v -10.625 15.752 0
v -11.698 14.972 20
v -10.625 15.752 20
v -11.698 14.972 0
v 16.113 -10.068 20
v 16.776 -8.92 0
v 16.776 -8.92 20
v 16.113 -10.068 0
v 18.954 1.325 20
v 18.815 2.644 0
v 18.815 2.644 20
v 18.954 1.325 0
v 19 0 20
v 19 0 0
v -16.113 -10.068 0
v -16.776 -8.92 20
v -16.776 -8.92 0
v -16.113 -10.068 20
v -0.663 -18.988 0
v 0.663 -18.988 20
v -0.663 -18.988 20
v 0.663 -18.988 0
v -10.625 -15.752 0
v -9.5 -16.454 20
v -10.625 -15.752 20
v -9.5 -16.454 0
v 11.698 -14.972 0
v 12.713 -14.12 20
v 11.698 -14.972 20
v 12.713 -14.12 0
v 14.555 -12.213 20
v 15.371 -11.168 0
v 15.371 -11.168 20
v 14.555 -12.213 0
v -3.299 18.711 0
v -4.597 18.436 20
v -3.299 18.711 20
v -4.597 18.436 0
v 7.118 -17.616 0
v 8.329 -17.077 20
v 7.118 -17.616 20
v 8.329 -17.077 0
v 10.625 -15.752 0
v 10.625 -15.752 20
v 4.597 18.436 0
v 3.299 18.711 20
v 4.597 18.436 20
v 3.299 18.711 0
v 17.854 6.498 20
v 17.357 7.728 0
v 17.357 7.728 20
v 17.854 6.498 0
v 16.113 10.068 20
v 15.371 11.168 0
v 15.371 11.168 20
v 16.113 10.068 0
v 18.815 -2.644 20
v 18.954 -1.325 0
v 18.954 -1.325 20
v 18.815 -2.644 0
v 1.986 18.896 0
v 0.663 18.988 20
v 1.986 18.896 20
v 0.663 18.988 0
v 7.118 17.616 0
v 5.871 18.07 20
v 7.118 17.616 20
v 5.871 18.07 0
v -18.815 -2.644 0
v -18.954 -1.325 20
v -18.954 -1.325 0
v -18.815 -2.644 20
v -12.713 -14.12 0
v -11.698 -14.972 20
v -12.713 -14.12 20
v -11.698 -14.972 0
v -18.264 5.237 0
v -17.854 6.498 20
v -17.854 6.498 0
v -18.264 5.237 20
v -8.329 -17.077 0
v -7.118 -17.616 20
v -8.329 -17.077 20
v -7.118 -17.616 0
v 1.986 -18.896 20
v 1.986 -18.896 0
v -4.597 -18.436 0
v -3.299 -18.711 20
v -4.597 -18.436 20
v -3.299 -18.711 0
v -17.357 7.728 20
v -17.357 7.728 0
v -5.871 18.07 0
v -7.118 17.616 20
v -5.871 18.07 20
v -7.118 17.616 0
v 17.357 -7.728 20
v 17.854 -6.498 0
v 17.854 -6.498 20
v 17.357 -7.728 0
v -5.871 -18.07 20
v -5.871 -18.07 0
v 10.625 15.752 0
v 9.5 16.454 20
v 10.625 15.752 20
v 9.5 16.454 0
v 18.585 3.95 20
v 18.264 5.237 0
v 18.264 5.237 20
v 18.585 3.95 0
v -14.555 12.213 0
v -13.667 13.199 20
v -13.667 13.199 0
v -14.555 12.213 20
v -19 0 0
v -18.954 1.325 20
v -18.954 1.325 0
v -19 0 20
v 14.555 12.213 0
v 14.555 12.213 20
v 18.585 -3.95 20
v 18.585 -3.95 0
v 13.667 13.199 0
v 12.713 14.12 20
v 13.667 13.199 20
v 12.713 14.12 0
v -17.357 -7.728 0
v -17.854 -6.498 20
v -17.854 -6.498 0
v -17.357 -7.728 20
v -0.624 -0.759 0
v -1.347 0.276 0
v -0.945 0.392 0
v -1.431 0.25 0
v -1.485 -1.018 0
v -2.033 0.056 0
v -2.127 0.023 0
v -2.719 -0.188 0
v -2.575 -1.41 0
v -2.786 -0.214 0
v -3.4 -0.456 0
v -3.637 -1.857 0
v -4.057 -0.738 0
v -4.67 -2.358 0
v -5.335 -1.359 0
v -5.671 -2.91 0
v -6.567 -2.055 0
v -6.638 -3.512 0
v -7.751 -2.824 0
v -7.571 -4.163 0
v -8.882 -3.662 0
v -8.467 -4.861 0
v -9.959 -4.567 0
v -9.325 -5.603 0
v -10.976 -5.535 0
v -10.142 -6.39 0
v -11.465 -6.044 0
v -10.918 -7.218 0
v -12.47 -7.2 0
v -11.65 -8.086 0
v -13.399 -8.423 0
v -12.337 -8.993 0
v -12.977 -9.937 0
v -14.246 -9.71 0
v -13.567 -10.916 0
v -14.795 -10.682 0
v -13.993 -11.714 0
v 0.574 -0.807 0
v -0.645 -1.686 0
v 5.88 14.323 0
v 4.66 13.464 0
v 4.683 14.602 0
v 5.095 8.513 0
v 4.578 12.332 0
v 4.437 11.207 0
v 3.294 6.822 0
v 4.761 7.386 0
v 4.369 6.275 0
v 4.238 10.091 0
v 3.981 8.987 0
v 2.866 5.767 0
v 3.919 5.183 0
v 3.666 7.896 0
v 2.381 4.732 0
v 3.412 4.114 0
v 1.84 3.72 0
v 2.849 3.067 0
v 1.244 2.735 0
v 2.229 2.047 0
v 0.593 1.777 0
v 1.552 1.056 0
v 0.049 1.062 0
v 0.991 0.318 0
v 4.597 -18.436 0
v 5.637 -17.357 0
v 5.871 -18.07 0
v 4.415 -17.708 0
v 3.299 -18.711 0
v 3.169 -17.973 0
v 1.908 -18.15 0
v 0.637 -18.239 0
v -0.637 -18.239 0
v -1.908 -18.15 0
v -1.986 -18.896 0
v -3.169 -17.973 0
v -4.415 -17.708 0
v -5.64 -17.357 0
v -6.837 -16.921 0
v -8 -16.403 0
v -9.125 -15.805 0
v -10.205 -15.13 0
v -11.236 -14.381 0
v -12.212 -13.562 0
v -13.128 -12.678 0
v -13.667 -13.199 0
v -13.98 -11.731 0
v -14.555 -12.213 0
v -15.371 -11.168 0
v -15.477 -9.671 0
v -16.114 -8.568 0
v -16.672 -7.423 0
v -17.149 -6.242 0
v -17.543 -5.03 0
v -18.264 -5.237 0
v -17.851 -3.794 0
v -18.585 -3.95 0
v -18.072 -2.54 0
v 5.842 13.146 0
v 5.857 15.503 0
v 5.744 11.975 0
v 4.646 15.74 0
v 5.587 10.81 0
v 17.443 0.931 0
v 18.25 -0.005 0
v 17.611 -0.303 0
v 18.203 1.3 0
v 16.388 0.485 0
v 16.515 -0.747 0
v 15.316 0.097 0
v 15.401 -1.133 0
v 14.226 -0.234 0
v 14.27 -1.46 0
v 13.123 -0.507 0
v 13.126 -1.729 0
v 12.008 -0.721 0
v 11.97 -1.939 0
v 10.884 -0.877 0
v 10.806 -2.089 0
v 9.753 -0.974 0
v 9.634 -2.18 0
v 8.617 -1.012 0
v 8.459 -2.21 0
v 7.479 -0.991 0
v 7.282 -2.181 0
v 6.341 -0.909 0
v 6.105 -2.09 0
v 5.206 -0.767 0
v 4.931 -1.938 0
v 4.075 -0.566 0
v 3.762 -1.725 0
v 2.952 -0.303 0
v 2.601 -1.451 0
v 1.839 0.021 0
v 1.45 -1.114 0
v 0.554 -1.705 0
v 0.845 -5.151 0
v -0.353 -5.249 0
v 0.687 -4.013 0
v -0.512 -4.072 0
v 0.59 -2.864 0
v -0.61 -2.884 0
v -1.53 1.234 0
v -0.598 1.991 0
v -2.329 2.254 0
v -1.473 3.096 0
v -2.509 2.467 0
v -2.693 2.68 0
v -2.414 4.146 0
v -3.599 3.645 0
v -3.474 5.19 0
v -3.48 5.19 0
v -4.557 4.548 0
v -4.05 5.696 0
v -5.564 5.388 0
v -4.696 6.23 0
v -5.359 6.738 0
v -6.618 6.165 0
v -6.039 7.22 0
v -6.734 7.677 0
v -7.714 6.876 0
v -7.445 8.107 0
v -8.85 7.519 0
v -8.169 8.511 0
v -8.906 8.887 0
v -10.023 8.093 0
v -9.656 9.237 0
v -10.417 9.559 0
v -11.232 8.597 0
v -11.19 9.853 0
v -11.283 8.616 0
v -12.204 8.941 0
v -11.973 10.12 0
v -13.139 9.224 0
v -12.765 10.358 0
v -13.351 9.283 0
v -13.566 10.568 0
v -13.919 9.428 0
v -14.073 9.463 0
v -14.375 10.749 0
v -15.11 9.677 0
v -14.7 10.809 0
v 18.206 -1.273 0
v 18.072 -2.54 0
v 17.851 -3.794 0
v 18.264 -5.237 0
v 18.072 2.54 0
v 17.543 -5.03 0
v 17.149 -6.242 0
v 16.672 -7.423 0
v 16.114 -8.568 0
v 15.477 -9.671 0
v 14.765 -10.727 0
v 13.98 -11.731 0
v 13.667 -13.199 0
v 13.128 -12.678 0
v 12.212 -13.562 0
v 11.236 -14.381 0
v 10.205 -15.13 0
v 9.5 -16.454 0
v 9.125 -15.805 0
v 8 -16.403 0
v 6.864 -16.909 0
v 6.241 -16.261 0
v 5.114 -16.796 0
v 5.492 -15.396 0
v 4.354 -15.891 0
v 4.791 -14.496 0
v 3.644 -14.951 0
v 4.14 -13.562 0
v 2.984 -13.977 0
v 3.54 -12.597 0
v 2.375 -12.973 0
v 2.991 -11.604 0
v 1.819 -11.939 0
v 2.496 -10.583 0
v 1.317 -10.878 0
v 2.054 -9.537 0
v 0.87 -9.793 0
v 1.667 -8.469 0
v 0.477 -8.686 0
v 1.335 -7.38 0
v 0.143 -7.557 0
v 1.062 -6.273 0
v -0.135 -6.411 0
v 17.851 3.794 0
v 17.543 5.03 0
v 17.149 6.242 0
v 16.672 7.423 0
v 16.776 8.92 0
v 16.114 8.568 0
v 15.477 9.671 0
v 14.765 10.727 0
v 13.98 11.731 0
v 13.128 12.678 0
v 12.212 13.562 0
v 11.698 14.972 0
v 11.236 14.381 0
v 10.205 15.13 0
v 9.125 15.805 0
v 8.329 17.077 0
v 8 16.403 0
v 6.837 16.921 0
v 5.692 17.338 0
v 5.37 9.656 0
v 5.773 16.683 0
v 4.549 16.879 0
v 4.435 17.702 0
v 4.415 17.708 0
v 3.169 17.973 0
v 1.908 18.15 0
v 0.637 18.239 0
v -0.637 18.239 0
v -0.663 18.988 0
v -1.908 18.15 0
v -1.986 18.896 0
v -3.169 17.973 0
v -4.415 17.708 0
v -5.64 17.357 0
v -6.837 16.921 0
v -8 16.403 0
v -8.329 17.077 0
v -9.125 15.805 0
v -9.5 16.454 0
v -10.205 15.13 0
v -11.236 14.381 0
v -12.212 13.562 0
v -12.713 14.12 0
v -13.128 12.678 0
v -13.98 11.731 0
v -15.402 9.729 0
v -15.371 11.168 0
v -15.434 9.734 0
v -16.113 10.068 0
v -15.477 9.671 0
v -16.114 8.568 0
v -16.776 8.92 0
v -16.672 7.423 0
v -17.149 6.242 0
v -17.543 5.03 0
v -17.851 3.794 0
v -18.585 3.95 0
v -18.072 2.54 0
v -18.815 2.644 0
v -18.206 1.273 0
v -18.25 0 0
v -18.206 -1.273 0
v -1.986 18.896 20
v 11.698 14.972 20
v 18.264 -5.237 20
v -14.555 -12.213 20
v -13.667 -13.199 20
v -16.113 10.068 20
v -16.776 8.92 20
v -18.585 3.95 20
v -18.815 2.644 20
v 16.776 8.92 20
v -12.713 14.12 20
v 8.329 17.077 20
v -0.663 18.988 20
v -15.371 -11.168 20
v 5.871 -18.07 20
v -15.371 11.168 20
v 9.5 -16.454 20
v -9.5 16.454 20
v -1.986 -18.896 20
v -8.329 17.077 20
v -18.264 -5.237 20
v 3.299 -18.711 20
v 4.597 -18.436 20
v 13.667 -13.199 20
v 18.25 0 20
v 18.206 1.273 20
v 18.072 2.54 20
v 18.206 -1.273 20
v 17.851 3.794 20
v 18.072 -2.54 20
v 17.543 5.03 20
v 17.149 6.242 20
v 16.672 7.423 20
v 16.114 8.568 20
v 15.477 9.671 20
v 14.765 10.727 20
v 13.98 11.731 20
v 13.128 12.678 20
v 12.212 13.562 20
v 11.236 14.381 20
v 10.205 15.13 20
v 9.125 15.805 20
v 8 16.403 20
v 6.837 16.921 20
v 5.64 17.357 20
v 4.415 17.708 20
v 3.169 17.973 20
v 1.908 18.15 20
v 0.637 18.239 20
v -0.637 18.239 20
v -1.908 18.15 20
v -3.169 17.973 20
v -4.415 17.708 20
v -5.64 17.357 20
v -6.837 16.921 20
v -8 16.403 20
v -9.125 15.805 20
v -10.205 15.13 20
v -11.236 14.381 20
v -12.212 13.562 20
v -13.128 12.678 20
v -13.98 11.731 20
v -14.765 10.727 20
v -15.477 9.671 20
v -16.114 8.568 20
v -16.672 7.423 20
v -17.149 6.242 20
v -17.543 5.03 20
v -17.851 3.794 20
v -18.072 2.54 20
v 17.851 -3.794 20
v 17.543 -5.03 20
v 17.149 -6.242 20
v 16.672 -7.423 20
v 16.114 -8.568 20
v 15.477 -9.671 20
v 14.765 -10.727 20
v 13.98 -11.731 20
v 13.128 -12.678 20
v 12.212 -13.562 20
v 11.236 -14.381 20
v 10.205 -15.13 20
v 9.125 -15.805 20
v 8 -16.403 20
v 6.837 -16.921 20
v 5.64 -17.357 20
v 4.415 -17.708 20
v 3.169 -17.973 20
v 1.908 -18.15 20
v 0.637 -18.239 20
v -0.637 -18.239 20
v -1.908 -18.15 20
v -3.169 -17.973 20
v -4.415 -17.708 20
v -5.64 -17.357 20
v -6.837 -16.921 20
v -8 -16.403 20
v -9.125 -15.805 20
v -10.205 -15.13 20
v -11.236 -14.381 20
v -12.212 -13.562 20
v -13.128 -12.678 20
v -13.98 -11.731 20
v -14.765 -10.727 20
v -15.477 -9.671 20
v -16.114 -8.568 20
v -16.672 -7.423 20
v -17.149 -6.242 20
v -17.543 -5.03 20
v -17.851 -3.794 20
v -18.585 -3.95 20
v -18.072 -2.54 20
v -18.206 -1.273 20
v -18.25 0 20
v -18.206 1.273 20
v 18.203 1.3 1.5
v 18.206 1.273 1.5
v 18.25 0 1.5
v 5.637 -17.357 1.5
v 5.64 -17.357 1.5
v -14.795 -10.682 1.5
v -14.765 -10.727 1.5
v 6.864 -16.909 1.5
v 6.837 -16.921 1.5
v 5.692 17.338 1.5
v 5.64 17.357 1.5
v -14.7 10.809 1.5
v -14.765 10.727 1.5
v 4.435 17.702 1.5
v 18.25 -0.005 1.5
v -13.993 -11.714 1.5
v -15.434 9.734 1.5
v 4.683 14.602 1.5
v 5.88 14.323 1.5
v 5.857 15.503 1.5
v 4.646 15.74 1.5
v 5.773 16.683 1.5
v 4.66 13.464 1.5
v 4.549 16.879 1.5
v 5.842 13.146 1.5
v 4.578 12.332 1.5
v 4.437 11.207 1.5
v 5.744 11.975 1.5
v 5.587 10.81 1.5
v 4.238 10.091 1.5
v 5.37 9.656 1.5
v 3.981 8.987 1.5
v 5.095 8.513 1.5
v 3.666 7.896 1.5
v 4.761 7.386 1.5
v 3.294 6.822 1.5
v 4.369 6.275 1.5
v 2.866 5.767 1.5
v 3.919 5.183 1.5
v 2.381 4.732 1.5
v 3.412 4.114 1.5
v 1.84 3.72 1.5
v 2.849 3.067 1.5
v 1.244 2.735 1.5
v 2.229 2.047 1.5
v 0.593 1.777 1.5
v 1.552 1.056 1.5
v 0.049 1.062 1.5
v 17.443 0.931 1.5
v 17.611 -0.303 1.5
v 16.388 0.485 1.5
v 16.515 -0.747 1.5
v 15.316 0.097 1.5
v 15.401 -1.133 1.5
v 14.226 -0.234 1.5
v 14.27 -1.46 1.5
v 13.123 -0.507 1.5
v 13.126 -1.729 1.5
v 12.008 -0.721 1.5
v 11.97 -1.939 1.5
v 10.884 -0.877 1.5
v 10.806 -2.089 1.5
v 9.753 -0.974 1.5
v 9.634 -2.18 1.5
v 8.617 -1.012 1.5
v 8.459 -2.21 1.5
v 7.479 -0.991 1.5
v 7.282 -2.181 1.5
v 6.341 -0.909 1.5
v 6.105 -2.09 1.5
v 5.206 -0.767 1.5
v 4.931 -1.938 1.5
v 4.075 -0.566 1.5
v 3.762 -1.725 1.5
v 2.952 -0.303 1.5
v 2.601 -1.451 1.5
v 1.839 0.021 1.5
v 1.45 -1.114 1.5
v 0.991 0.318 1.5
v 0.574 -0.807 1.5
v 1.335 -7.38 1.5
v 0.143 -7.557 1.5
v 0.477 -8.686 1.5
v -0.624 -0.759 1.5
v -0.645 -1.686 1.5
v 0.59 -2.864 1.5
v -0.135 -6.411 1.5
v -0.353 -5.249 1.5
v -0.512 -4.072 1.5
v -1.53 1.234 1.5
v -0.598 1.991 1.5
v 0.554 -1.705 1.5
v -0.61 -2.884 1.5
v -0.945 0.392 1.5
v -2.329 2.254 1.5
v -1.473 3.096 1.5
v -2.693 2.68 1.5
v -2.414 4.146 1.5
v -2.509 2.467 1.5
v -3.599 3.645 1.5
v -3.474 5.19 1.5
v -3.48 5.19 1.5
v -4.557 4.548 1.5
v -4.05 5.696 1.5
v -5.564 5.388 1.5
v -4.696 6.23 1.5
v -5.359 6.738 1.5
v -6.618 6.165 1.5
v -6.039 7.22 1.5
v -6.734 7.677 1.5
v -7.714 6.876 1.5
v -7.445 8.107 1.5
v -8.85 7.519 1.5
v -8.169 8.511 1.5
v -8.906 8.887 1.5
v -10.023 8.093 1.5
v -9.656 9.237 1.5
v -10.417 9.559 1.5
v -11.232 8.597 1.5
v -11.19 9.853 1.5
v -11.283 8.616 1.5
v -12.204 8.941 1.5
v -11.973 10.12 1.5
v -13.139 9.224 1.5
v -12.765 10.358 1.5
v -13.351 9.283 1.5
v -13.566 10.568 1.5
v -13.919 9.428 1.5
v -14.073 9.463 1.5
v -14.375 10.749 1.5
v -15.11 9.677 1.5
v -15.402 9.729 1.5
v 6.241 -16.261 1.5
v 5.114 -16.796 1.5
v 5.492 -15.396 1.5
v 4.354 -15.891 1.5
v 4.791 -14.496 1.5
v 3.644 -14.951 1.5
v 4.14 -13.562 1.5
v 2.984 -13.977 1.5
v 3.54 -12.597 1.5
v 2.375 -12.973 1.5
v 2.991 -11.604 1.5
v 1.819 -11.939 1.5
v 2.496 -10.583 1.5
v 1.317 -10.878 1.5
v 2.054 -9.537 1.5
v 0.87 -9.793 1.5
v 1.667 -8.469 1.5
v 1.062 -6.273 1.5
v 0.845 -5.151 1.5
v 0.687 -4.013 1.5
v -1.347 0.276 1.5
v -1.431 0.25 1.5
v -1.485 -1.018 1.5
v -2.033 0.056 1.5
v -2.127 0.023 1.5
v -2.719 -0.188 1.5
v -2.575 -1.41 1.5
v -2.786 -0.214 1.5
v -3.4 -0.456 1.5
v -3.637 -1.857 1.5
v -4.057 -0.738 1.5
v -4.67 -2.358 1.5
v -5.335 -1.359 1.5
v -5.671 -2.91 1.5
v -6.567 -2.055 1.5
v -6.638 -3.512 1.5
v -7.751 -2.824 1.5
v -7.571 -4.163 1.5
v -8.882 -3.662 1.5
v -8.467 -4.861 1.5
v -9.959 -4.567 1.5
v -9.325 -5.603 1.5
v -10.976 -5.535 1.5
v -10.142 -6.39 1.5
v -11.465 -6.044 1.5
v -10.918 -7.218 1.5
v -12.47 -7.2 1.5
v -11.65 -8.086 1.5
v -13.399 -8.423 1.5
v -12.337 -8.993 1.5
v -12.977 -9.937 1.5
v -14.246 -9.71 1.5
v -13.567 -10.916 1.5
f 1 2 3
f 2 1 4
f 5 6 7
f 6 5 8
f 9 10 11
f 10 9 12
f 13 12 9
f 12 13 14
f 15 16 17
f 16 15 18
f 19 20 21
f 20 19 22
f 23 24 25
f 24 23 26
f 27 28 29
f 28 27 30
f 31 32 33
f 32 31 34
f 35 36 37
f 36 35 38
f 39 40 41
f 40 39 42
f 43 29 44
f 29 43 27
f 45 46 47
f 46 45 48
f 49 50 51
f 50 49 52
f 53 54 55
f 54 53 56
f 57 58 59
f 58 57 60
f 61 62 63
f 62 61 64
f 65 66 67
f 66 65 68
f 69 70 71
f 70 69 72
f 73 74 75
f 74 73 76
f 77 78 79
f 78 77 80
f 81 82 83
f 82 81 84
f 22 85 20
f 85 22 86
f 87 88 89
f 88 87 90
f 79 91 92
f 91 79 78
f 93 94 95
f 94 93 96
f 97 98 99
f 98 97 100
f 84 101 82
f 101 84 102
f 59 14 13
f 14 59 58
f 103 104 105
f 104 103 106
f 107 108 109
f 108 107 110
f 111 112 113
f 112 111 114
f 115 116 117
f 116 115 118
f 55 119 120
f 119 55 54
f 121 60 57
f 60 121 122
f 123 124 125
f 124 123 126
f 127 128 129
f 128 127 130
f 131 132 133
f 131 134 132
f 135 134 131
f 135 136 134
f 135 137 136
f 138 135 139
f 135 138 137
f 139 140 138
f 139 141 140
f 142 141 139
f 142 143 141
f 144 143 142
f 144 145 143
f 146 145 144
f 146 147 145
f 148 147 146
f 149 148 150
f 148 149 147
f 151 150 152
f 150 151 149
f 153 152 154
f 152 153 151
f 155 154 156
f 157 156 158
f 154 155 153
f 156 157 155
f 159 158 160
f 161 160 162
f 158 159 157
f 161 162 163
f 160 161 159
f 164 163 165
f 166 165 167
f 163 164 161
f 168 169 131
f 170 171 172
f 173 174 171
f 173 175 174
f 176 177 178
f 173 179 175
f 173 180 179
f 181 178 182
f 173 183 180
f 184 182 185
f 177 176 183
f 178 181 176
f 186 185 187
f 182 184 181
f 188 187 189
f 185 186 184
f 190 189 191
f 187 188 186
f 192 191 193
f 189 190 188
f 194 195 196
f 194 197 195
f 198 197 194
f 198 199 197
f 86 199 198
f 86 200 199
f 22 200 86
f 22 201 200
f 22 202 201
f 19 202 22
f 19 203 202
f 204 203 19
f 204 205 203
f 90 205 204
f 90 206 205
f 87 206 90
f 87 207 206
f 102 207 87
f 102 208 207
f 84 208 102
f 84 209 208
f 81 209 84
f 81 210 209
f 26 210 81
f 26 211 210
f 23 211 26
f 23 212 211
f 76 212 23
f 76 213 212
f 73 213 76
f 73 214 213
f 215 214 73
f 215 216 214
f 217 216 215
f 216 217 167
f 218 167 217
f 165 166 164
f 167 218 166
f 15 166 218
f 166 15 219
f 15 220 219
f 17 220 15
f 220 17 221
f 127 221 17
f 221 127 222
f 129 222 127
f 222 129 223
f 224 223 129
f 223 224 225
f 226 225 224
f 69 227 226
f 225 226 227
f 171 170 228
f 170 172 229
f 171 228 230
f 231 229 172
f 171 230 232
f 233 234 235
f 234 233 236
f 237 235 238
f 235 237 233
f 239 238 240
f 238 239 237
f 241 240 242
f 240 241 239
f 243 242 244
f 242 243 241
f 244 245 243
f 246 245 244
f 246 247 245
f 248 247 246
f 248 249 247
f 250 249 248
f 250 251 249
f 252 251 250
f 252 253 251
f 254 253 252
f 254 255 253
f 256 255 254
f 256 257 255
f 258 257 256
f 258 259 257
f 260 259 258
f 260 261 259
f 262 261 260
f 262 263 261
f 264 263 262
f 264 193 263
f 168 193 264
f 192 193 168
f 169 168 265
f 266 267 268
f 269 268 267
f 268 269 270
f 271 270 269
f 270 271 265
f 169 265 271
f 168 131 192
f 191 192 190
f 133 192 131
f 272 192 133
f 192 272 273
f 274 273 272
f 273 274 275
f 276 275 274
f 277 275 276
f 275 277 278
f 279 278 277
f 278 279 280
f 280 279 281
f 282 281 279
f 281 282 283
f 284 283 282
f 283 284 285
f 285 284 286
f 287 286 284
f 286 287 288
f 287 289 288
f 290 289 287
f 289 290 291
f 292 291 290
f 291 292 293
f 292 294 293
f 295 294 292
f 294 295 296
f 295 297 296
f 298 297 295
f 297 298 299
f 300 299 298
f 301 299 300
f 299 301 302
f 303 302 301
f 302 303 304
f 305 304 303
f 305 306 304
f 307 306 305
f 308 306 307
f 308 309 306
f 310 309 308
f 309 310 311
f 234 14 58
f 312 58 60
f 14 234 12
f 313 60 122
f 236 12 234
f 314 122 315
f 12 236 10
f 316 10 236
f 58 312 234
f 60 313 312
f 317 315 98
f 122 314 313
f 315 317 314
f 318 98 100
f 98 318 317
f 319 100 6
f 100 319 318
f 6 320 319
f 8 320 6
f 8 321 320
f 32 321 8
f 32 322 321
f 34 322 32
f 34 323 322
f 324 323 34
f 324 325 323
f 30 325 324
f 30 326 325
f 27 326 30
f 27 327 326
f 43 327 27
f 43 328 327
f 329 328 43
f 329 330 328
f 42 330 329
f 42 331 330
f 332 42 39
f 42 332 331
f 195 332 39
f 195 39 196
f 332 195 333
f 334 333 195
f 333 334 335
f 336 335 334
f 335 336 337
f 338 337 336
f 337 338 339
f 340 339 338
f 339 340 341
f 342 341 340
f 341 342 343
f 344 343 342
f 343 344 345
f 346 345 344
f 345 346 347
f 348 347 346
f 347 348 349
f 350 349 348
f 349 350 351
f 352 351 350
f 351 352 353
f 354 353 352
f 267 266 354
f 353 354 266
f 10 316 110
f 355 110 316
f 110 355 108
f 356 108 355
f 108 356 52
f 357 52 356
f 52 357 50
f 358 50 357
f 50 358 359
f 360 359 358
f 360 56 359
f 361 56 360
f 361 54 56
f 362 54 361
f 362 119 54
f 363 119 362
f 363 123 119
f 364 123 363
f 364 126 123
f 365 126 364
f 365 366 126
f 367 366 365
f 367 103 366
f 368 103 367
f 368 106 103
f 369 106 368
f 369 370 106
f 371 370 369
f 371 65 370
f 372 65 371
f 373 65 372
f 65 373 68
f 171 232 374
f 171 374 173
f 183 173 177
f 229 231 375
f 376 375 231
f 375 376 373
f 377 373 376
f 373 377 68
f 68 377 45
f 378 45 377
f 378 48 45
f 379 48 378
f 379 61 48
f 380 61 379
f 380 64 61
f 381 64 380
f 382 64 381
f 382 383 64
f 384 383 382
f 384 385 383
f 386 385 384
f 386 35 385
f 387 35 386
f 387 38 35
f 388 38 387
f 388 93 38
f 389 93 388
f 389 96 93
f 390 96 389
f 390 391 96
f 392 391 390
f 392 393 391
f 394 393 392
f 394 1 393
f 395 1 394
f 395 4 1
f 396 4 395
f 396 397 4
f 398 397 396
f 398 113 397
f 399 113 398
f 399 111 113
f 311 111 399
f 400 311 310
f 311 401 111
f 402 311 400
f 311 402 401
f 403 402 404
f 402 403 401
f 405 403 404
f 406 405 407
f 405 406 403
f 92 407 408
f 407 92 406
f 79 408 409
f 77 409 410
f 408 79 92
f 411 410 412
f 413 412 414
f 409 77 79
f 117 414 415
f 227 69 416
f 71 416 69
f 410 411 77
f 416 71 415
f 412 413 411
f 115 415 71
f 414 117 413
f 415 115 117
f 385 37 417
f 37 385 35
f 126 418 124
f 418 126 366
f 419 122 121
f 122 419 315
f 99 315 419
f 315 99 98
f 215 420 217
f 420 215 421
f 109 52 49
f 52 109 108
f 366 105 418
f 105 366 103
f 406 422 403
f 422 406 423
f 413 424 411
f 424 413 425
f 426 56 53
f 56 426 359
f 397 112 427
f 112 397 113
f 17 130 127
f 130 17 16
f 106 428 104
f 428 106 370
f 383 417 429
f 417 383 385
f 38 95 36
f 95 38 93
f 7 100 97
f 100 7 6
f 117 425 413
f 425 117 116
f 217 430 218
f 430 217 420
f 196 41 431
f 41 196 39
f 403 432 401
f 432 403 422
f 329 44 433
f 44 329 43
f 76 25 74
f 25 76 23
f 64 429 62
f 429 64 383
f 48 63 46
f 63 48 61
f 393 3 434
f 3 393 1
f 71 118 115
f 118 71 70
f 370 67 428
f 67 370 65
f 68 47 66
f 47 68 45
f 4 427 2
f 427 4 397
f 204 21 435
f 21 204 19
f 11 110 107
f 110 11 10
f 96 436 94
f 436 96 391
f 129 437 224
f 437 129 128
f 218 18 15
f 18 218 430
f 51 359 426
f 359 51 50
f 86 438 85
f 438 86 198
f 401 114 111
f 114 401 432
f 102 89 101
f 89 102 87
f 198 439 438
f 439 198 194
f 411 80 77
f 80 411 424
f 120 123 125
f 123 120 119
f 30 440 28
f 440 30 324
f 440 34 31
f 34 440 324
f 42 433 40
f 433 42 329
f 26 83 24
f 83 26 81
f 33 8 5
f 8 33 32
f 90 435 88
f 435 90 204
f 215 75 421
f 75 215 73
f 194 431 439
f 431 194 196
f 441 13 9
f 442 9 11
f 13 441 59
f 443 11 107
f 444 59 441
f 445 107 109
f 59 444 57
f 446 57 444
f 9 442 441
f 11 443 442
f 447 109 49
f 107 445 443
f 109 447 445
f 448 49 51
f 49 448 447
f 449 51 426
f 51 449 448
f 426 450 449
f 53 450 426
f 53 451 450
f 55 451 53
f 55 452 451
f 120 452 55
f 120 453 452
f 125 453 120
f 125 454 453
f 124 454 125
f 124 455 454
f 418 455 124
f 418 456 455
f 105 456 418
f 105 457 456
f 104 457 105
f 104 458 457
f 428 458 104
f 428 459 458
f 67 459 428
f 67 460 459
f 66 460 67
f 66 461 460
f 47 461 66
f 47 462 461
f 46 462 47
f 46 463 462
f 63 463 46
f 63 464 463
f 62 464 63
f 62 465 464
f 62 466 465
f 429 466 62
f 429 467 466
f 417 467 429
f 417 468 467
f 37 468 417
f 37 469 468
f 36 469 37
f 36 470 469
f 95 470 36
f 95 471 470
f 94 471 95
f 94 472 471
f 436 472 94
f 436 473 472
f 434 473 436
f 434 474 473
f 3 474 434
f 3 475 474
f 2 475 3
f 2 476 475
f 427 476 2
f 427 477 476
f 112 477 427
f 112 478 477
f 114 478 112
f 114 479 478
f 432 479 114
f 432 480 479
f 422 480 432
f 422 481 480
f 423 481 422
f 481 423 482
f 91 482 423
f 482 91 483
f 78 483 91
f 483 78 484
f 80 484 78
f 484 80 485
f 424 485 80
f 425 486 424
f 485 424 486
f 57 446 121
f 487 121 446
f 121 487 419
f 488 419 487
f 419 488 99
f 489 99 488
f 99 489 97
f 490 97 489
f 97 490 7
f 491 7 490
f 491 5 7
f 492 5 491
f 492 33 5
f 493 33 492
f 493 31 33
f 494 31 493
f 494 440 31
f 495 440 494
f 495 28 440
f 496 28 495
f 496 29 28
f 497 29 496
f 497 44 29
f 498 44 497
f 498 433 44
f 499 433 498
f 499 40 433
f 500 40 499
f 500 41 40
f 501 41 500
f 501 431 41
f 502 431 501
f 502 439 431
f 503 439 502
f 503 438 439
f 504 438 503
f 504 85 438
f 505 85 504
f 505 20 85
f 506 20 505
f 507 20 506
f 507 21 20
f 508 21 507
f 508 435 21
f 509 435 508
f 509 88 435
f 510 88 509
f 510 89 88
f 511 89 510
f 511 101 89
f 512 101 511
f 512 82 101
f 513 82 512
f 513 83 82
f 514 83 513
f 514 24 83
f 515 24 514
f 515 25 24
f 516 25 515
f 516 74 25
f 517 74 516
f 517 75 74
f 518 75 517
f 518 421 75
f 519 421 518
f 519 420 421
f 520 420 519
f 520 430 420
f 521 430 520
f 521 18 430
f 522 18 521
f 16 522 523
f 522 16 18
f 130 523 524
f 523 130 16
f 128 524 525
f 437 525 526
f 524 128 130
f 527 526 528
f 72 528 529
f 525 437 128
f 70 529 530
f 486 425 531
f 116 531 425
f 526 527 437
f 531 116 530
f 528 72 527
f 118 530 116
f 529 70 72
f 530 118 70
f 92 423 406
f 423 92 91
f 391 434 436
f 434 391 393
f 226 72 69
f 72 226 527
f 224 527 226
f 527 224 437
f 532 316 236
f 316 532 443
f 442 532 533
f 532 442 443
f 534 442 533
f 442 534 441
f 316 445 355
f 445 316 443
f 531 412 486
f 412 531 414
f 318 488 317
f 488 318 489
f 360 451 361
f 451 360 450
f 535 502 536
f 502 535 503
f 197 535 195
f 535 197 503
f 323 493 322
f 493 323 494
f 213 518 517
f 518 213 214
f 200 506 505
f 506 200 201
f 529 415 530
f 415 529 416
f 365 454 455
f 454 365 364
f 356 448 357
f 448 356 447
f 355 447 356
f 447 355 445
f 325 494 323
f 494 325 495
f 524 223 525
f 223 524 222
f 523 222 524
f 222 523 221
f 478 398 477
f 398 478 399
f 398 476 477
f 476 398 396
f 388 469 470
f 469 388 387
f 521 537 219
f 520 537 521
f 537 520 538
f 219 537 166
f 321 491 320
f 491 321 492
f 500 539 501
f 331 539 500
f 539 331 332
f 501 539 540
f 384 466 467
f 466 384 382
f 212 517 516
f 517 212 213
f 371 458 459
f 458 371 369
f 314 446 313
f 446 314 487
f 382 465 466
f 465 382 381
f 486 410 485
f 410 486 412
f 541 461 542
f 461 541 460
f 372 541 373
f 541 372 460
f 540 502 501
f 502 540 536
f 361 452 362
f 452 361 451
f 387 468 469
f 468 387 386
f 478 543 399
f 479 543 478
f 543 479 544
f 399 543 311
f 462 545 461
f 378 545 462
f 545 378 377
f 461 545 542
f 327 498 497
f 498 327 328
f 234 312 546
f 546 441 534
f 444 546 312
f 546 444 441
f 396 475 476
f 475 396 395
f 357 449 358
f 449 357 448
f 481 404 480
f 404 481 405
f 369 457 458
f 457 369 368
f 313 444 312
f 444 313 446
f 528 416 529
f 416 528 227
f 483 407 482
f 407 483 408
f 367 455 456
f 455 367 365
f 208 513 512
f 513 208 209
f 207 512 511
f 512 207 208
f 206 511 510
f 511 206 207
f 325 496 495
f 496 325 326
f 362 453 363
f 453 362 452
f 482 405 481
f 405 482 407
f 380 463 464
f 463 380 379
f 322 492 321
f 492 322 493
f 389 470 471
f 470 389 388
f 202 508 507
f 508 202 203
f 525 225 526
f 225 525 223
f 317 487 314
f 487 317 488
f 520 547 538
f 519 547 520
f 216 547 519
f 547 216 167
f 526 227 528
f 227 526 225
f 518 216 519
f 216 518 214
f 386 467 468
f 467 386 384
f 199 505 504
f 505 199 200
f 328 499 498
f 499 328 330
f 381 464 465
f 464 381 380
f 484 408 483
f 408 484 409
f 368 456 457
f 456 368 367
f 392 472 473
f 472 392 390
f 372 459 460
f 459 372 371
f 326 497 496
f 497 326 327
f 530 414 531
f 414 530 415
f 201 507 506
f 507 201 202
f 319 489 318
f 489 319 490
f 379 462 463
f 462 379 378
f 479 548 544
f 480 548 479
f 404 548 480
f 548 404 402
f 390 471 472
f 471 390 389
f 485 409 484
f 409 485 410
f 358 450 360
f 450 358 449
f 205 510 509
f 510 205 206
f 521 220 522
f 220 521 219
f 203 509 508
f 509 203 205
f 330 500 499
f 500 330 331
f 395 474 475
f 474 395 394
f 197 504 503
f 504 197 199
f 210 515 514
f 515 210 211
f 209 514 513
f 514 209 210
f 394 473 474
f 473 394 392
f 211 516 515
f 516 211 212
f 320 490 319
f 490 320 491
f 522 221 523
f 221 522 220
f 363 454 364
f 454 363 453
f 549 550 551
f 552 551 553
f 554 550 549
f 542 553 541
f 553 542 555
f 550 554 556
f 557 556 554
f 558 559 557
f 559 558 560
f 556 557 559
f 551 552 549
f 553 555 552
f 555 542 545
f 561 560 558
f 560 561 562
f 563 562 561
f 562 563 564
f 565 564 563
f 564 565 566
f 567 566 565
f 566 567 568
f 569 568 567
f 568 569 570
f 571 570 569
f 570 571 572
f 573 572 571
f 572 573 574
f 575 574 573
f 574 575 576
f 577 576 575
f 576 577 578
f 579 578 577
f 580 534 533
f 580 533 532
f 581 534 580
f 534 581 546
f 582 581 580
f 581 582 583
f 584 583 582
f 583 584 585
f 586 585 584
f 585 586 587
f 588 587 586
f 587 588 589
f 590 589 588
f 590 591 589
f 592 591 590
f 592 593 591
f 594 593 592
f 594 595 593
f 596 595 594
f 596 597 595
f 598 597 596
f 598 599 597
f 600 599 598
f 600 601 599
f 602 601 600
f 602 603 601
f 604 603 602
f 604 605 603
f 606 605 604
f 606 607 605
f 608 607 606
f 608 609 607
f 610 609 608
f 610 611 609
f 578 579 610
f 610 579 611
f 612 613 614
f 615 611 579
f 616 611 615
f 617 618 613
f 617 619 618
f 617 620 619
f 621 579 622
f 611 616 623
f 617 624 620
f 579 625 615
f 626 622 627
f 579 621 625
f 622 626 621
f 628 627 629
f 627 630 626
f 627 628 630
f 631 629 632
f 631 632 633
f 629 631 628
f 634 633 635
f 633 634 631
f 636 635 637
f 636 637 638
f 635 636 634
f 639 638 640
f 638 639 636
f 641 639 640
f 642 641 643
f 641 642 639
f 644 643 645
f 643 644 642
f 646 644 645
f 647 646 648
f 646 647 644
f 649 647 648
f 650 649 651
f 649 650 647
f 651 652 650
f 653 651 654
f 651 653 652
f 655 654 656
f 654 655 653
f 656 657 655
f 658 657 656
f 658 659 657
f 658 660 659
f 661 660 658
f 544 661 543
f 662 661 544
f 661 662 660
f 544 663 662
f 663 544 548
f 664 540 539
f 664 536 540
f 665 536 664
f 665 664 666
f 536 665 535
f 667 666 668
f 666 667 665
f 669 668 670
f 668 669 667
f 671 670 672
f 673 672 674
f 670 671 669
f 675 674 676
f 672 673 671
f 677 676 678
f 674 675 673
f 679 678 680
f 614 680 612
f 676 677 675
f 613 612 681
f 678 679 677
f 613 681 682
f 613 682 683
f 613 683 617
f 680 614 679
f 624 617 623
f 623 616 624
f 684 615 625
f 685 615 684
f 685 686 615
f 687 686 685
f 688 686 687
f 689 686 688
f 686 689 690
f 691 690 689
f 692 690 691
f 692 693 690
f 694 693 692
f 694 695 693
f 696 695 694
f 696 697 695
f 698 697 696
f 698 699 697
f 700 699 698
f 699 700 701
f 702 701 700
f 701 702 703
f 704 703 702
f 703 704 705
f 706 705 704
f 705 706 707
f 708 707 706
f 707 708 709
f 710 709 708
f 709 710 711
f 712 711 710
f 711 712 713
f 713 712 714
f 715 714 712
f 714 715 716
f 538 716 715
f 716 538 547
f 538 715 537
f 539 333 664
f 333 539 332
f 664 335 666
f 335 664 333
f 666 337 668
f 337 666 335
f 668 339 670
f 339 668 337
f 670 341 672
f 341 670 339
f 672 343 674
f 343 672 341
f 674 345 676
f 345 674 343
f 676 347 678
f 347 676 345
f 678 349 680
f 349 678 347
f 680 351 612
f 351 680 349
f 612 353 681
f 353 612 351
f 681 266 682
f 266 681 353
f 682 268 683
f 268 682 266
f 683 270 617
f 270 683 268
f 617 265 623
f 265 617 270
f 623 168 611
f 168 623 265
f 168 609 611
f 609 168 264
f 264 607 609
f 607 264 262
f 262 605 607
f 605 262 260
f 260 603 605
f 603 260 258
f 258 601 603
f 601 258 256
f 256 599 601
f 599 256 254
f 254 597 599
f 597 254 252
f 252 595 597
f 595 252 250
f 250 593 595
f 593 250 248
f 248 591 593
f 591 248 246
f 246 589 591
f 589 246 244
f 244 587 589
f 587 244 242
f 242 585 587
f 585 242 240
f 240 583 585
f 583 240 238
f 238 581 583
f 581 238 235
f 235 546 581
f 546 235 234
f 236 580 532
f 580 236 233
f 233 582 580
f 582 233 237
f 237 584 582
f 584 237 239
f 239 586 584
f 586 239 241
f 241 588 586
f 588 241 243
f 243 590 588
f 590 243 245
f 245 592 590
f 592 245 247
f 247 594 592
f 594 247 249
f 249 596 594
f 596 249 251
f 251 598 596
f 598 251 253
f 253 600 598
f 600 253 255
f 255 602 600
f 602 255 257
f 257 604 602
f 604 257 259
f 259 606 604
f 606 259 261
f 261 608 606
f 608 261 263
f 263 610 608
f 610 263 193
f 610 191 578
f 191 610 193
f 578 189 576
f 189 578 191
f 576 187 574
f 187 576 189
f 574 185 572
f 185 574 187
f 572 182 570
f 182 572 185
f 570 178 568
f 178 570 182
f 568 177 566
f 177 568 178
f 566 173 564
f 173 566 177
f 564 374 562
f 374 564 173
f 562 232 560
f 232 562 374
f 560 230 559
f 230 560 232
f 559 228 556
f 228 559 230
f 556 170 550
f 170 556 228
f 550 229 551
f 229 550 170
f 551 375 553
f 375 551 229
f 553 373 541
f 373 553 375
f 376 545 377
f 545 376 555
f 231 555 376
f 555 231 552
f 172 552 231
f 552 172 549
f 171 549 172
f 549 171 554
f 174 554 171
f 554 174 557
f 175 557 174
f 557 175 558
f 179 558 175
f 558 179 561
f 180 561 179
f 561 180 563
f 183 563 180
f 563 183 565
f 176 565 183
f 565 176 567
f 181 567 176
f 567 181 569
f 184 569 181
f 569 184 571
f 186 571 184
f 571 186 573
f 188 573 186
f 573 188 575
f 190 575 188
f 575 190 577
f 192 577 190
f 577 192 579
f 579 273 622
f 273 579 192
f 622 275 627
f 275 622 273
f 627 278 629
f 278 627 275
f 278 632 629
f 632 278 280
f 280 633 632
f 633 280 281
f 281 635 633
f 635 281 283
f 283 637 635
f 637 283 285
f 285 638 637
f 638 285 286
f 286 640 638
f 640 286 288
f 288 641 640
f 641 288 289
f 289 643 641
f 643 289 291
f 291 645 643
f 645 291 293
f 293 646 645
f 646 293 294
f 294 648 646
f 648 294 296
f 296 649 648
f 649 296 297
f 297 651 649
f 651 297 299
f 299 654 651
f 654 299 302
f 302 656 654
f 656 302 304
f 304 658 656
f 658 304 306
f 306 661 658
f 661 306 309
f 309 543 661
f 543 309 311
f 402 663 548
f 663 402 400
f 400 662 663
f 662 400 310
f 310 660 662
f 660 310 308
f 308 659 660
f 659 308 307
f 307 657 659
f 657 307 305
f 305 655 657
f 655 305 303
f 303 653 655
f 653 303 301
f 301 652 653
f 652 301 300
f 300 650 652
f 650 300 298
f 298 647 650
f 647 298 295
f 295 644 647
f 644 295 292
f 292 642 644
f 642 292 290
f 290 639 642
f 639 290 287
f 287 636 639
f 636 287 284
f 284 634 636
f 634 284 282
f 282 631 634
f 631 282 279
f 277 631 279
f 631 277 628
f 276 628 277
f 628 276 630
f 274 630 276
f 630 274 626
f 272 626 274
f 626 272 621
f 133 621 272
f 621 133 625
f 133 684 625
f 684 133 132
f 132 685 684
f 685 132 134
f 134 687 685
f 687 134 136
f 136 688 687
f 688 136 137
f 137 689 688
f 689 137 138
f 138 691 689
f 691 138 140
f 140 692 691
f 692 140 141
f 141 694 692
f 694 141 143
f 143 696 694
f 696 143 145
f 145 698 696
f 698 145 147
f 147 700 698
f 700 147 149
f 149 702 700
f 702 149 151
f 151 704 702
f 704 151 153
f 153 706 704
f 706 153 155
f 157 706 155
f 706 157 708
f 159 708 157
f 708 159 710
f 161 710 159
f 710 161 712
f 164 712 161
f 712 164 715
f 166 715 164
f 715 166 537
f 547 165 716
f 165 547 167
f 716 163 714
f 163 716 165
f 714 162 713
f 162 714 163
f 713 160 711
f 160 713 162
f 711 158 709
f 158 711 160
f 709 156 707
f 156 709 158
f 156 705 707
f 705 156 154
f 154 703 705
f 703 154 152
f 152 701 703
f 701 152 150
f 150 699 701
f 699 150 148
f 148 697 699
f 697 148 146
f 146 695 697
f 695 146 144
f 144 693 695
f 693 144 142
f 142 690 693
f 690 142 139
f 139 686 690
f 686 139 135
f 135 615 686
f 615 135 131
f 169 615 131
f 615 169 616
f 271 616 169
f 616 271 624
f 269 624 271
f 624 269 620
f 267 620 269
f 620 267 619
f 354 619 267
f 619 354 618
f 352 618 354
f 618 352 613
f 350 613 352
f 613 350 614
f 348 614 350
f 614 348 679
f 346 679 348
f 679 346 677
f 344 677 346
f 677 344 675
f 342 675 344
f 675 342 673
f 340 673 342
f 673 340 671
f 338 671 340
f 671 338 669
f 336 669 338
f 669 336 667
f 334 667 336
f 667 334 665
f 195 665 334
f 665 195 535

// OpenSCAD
module barrel(outer_radius, inner_radius, height) {
    scale([1, 1, height])
    difference() {
        cylinder(r=outer_radius);
        translate([0, 0, -0.5]) scale([1, 1, 2])
        cylinder(r=inner_radius);
    }
}

$fn = 90;

barrel(38/2, 36.5/2, 20);

linear_extrude(height=1.5)
scale(0.35, 0.35, 1)
import("bottom.dxf");
